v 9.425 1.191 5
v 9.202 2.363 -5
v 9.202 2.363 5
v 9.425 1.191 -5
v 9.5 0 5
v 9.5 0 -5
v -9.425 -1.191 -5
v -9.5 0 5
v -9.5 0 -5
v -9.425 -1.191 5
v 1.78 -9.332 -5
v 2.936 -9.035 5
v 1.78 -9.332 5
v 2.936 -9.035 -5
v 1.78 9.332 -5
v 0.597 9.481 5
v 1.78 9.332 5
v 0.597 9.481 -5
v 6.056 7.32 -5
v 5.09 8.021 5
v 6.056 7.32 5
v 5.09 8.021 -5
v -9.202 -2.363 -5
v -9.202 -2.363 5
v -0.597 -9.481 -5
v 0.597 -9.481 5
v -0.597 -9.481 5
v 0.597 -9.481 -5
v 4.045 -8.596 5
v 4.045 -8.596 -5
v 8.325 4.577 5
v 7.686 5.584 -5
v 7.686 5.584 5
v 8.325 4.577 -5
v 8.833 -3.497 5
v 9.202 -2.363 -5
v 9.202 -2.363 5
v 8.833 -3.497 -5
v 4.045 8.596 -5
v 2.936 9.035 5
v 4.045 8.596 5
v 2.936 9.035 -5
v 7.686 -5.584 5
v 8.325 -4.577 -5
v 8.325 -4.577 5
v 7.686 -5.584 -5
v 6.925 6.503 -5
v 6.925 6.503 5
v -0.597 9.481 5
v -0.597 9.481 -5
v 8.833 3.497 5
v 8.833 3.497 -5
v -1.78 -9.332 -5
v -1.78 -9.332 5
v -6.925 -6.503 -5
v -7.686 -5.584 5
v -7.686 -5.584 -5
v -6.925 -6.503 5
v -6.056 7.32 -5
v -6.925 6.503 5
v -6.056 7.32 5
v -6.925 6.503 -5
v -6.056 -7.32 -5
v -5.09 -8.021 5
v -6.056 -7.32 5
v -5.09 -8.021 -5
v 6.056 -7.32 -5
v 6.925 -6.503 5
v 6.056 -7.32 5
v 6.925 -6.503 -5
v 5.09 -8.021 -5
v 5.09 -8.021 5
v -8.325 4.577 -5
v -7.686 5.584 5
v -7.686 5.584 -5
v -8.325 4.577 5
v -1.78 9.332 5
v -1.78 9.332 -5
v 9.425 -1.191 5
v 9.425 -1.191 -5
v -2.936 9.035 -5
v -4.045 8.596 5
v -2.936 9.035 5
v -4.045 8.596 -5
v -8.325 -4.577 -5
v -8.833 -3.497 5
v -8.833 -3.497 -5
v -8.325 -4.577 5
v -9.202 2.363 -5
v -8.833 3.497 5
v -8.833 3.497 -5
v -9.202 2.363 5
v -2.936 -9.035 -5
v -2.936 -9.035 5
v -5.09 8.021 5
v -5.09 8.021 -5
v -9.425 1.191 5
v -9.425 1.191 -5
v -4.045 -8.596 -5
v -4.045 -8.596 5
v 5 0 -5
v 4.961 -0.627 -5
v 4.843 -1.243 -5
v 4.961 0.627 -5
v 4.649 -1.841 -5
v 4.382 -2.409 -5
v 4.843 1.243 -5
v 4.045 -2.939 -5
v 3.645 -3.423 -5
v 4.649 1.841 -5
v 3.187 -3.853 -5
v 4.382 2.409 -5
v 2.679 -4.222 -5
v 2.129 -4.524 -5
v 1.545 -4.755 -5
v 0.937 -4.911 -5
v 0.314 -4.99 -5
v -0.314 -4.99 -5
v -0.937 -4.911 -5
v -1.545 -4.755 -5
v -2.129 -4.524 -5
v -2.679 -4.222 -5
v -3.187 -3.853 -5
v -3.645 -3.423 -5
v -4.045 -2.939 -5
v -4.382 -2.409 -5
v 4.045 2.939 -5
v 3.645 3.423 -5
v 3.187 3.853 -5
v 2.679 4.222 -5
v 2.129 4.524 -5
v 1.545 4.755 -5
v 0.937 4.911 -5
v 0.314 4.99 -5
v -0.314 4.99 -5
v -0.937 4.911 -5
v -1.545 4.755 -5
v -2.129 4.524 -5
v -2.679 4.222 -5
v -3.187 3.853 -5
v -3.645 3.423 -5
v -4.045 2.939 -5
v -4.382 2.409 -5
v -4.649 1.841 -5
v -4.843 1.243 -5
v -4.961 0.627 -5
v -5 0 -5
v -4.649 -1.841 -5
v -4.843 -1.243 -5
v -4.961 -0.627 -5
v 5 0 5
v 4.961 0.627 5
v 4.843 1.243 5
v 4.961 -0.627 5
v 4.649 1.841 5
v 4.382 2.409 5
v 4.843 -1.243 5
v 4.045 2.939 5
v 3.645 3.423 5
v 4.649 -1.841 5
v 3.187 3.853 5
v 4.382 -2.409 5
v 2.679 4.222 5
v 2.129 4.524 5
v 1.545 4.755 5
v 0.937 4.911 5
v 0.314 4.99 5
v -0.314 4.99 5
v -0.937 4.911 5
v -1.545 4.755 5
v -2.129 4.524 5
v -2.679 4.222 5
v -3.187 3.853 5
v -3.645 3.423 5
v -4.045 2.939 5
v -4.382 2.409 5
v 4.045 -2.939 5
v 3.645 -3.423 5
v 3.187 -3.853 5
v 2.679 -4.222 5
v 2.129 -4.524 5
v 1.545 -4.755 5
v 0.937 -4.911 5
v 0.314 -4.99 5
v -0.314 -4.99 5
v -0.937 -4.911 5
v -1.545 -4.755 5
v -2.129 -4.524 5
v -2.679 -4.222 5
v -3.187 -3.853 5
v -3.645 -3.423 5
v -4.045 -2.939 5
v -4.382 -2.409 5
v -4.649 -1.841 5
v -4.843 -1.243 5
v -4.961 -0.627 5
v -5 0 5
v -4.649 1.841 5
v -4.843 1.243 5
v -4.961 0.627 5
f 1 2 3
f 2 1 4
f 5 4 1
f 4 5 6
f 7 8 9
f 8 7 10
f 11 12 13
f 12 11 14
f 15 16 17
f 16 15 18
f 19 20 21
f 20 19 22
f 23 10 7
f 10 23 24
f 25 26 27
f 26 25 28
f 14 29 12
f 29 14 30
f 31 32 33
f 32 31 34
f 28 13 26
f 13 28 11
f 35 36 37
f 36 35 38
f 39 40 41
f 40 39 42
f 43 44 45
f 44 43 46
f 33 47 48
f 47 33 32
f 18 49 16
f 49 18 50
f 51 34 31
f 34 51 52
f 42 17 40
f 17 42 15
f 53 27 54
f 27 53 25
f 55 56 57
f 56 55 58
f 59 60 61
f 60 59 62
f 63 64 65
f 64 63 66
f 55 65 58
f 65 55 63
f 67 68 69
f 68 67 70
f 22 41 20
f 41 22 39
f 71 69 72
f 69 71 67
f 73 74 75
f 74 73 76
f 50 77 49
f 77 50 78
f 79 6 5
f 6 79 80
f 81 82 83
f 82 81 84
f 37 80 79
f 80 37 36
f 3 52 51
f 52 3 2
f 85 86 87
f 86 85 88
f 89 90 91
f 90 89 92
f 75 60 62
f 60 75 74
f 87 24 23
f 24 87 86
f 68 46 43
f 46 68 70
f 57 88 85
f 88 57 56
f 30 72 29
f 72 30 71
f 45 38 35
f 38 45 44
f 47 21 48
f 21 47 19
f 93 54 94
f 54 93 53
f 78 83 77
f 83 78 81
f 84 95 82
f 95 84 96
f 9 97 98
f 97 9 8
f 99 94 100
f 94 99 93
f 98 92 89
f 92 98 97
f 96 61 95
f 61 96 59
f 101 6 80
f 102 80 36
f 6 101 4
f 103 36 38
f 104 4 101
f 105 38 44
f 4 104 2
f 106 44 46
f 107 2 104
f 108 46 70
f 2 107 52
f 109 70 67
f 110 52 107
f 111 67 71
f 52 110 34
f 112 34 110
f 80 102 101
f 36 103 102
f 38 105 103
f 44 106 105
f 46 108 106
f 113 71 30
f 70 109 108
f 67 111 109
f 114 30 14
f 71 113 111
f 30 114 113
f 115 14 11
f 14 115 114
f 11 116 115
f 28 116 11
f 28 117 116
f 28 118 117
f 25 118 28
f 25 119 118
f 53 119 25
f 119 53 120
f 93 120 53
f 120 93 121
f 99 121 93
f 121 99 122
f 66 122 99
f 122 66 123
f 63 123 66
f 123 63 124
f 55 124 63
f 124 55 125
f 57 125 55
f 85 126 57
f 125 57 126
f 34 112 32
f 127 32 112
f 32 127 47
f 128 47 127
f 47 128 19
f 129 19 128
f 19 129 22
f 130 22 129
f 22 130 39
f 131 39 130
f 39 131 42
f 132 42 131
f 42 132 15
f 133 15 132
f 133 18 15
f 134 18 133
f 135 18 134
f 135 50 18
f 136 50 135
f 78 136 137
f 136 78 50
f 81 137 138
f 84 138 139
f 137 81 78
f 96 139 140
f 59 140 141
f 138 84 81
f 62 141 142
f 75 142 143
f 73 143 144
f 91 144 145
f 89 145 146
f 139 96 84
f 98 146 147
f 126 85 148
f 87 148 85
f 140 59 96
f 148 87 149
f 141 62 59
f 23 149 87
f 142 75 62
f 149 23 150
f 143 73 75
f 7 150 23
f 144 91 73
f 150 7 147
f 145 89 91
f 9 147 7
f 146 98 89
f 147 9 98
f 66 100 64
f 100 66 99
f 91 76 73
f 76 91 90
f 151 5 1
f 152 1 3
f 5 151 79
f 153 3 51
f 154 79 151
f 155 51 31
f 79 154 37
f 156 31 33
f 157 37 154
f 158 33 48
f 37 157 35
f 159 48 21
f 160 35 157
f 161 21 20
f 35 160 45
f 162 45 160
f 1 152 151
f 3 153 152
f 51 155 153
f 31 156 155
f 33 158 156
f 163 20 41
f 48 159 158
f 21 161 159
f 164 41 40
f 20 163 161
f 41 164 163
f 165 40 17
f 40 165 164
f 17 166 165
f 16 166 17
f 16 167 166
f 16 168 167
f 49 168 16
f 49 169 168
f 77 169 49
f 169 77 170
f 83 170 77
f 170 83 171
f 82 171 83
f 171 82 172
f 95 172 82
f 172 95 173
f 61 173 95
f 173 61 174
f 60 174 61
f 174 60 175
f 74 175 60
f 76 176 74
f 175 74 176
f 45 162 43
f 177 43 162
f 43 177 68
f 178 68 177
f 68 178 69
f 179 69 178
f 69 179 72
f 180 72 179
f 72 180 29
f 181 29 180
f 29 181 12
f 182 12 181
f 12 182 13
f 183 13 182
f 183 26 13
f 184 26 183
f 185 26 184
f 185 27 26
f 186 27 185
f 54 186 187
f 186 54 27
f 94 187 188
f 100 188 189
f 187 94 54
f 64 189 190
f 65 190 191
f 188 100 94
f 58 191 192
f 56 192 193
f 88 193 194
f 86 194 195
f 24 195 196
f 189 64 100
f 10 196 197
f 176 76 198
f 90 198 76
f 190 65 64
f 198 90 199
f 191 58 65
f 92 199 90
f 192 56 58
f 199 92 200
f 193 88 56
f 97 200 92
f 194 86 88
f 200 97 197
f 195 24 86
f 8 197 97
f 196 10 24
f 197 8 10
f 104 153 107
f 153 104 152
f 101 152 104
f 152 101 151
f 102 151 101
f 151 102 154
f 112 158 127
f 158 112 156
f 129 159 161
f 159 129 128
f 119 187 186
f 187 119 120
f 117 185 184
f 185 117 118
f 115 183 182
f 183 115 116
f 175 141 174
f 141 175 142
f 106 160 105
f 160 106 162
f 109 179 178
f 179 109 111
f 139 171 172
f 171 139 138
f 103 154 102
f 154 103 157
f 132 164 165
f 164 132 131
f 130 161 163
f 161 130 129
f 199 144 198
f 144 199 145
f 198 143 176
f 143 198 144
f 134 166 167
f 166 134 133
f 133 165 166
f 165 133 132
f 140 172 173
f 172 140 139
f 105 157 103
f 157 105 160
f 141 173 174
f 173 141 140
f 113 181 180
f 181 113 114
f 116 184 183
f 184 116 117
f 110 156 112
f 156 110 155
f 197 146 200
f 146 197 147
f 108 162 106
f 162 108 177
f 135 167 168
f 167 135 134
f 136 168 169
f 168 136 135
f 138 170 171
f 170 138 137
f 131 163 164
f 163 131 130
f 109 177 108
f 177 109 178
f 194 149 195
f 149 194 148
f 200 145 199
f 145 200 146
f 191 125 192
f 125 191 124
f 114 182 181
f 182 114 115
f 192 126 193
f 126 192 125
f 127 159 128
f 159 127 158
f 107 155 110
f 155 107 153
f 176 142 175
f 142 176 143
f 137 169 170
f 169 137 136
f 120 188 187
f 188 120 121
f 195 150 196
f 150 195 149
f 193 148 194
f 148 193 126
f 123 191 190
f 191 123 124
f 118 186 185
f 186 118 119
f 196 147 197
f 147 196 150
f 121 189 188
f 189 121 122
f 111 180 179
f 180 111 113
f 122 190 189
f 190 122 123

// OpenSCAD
$fn = 50;


difference() {
	union() {
		translate(v = [0, 0, -5.0000000000]) {
			cylinder(h = 10, r = 9.5000000000);
		}
	}
	union() {
		translate(v = [0, 0, -100.0000000000]) {
			cylinder(h = 200, r = 5.0000000000);
		}
	}
}
